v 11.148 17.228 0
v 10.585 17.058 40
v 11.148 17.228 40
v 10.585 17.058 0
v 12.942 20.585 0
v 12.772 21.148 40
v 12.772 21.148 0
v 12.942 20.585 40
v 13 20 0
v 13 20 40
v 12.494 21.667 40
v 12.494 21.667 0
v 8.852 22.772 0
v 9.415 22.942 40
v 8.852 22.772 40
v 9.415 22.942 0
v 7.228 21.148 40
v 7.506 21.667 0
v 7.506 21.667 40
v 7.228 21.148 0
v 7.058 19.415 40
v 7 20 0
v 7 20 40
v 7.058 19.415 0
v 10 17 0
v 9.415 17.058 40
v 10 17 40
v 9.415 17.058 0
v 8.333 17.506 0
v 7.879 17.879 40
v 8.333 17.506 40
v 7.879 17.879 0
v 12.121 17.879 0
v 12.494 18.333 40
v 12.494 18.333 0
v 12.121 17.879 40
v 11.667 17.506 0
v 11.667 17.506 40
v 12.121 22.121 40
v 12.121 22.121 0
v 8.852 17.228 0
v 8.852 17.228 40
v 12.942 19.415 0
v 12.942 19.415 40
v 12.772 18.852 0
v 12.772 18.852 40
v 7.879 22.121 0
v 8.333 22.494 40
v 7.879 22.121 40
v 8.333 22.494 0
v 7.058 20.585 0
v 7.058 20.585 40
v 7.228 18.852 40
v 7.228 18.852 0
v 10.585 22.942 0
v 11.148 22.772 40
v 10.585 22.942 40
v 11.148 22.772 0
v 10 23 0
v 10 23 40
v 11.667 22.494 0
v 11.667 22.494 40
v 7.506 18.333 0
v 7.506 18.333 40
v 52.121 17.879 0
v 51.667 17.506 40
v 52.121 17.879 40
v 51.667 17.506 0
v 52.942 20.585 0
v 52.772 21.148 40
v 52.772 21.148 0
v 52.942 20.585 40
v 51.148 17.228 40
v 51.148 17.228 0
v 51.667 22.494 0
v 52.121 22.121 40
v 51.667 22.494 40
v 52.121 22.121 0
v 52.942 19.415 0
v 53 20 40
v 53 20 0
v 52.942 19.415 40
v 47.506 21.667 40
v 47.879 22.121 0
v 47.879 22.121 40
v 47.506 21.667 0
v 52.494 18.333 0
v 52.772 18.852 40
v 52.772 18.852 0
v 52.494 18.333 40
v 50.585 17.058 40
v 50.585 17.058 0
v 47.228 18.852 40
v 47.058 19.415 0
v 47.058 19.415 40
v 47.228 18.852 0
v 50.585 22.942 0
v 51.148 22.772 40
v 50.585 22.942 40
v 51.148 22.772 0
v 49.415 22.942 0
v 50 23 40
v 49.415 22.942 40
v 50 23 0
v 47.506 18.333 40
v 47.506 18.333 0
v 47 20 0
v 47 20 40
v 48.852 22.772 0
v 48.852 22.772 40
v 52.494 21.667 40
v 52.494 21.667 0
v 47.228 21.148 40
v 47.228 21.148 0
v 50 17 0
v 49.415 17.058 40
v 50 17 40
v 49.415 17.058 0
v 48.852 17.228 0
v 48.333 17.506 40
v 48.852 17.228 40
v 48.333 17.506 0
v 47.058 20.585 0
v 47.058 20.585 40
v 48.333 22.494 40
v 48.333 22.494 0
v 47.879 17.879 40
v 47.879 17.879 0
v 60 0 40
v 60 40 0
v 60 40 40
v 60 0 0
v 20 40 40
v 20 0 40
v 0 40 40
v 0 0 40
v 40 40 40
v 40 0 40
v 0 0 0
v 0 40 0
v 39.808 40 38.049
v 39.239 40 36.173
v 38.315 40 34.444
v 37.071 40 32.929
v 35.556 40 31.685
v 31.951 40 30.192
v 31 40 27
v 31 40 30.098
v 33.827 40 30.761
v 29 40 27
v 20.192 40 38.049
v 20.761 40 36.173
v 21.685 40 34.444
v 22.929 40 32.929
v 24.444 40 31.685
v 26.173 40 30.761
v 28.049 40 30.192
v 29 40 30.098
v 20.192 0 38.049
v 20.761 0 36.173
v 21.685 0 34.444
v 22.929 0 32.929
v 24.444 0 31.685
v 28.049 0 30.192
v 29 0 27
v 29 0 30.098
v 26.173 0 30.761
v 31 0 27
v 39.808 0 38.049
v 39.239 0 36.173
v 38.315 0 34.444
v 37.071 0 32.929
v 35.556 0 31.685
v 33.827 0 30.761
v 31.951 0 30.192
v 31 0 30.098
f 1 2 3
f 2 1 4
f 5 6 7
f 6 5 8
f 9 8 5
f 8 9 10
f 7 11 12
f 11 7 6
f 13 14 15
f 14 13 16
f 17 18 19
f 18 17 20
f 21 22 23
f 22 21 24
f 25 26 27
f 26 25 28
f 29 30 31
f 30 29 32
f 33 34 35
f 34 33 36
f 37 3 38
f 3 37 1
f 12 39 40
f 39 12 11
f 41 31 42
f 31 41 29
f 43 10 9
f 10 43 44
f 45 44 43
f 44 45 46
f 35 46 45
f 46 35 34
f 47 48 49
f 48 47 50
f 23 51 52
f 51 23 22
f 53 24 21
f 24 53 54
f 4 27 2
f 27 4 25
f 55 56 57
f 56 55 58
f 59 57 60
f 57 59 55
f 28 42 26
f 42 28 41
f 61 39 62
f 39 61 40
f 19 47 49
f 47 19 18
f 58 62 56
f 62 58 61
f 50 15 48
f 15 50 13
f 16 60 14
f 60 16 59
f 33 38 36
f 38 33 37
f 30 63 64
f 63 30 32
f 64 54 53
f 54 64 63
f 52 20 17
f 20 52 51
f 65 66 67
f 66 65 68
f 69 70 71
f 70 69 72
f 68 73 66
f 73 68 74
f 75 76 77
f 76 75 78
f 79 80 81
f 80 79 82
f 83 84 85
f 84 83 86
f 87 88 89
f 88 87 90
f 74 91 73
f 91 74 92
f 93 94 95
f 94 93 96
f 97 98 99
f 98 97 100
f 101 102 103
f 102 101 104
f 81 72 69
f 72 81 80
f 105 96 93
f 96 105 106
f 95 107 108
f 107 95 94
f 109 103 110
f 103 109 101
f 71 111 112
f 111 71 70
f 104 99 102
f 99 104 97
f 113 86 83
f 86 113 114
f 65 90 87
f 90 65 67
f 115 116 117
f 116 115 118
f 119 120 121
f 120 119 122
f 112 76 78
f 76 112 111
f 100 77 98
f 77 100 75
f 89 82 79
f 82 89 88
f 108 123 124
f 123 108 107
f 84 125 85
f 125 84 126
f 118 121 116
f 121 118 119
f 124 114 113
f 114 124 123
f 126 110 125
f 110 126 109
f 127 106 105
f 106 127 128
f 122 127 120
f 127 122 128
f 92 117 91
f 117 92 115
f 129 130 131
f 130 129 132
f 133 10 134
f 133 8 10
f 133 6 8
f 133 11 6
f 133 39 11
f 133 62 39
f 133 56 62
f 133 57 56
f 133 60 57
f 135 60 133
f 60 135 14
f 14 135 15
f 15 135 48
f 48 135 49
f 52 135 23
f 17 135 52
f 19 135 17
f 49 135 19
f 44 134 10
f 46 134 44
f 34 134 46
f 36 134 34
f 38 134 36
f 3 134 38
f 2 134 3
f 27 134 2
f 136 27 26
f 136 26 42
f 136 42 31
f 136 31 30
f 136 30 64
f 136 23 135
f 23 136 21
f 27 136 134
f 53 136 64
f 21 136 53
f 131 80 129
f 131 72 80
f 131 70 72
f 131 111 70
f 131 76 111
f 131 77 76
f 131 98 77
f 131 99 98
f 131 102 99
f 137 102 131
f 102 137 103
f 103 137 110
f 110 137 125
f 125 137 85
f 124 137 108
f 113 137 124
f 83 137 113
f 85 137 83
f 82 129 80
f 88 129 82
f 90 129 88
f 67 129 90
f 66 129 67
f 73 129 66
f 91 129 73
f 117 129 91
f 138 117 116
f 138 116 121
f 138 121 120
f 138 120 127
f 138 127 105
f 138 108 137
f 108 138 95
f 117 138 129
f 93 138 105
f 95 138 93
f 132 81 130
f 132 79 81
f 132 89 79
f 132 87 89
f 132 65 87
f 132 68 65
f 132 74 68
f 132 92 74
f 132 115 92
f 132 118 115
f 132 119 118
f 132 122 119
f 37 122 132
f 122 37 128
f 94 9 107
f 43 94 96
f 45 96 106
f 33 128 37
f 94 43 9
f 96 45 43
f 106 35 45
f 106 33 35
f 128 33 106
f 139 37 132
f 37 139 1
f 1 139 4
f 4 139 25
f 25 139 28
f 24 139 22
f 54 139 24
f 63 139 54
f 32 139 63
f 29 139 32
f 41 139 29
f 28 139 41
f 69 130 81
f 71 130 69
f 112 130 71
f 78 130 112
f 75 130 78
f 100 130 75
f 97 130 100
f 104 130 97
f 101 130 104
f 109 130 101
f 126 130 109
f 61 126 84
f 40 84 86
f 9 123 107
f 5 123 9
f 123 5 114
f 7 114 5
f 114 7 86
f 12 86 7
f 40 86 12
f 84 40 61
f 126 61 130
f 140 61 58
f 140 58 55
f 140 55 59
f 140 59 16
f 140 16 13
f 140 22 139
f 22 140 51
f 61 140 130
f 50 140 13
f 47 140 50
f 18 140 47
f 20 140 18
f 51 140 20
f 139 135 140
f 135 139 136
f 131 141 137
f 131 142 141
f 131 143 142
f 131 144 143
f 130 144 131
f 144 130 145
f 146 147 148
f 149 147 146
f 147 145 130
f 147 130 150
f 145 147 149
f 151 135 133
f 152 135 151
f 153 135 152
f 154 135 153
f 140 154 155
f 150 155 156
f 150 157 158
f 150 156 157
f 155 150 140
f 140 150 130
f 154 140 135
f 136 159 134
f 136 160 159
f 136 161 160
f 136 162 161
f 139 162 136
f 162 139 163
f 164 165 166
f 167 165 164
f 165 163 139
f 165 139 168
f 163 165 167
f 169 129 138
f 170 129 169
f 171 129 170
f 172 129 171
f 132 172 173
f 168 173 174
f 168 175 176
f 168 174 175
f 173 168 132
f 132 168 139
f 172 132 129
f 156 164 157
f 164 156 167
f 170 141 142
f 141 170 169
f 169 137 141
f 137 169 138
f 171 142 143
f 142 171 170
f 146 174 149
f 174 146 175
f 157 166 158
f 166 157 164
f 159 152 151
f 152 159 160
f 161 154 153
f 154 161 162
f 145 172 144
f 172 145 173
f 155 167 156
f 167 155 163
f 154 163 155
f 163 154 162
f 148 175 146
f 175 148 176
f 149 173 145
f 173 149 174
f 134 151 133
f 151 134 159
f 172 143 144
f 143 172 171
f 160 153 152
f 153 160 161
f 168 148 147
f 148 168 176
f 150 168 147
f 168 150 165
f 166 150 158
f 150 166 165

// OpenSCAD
$fn = 32;

// ----------------------------------------------------------------------
// Saddle clamp: split shaft clamp
// ----------------------------------------------------------------------

// --- parameters (mm) ---
blk_l = 60;               // block length, X
blk_w = 40;               // block width, Y
blk_h = 40;               // block height
clamp_r = 10;             // shaft groove radius
hole_r = 3;               // bolt hole radius
hole_m = 10;              // bolt hole margin from the ends
saw_w = 2;                // saw kerf width

saw_depth = clamp_r + 3;  // saw kerf depth

difference() {
  cube([blk_l, blk_w, blk_h]);
  translate([blk_l / 2, -1, blk_h])
    rotate([-90, 0, 0])
      cylinder(h = blk_w + 2, r = clamp_r);
  for (sx = [0, 1])
    translate([sx ? blk_l - hole_m : hole_m, blk_w / 2, -1])
      cylinder(r = hole_r, h = blk_h + 2);
  translate([blk_l / 2 - saw_w / 2, -1, blk_h - saw_depth])
    cube([saw_w, blk_w + 2, saw_depth + 1]);
}
